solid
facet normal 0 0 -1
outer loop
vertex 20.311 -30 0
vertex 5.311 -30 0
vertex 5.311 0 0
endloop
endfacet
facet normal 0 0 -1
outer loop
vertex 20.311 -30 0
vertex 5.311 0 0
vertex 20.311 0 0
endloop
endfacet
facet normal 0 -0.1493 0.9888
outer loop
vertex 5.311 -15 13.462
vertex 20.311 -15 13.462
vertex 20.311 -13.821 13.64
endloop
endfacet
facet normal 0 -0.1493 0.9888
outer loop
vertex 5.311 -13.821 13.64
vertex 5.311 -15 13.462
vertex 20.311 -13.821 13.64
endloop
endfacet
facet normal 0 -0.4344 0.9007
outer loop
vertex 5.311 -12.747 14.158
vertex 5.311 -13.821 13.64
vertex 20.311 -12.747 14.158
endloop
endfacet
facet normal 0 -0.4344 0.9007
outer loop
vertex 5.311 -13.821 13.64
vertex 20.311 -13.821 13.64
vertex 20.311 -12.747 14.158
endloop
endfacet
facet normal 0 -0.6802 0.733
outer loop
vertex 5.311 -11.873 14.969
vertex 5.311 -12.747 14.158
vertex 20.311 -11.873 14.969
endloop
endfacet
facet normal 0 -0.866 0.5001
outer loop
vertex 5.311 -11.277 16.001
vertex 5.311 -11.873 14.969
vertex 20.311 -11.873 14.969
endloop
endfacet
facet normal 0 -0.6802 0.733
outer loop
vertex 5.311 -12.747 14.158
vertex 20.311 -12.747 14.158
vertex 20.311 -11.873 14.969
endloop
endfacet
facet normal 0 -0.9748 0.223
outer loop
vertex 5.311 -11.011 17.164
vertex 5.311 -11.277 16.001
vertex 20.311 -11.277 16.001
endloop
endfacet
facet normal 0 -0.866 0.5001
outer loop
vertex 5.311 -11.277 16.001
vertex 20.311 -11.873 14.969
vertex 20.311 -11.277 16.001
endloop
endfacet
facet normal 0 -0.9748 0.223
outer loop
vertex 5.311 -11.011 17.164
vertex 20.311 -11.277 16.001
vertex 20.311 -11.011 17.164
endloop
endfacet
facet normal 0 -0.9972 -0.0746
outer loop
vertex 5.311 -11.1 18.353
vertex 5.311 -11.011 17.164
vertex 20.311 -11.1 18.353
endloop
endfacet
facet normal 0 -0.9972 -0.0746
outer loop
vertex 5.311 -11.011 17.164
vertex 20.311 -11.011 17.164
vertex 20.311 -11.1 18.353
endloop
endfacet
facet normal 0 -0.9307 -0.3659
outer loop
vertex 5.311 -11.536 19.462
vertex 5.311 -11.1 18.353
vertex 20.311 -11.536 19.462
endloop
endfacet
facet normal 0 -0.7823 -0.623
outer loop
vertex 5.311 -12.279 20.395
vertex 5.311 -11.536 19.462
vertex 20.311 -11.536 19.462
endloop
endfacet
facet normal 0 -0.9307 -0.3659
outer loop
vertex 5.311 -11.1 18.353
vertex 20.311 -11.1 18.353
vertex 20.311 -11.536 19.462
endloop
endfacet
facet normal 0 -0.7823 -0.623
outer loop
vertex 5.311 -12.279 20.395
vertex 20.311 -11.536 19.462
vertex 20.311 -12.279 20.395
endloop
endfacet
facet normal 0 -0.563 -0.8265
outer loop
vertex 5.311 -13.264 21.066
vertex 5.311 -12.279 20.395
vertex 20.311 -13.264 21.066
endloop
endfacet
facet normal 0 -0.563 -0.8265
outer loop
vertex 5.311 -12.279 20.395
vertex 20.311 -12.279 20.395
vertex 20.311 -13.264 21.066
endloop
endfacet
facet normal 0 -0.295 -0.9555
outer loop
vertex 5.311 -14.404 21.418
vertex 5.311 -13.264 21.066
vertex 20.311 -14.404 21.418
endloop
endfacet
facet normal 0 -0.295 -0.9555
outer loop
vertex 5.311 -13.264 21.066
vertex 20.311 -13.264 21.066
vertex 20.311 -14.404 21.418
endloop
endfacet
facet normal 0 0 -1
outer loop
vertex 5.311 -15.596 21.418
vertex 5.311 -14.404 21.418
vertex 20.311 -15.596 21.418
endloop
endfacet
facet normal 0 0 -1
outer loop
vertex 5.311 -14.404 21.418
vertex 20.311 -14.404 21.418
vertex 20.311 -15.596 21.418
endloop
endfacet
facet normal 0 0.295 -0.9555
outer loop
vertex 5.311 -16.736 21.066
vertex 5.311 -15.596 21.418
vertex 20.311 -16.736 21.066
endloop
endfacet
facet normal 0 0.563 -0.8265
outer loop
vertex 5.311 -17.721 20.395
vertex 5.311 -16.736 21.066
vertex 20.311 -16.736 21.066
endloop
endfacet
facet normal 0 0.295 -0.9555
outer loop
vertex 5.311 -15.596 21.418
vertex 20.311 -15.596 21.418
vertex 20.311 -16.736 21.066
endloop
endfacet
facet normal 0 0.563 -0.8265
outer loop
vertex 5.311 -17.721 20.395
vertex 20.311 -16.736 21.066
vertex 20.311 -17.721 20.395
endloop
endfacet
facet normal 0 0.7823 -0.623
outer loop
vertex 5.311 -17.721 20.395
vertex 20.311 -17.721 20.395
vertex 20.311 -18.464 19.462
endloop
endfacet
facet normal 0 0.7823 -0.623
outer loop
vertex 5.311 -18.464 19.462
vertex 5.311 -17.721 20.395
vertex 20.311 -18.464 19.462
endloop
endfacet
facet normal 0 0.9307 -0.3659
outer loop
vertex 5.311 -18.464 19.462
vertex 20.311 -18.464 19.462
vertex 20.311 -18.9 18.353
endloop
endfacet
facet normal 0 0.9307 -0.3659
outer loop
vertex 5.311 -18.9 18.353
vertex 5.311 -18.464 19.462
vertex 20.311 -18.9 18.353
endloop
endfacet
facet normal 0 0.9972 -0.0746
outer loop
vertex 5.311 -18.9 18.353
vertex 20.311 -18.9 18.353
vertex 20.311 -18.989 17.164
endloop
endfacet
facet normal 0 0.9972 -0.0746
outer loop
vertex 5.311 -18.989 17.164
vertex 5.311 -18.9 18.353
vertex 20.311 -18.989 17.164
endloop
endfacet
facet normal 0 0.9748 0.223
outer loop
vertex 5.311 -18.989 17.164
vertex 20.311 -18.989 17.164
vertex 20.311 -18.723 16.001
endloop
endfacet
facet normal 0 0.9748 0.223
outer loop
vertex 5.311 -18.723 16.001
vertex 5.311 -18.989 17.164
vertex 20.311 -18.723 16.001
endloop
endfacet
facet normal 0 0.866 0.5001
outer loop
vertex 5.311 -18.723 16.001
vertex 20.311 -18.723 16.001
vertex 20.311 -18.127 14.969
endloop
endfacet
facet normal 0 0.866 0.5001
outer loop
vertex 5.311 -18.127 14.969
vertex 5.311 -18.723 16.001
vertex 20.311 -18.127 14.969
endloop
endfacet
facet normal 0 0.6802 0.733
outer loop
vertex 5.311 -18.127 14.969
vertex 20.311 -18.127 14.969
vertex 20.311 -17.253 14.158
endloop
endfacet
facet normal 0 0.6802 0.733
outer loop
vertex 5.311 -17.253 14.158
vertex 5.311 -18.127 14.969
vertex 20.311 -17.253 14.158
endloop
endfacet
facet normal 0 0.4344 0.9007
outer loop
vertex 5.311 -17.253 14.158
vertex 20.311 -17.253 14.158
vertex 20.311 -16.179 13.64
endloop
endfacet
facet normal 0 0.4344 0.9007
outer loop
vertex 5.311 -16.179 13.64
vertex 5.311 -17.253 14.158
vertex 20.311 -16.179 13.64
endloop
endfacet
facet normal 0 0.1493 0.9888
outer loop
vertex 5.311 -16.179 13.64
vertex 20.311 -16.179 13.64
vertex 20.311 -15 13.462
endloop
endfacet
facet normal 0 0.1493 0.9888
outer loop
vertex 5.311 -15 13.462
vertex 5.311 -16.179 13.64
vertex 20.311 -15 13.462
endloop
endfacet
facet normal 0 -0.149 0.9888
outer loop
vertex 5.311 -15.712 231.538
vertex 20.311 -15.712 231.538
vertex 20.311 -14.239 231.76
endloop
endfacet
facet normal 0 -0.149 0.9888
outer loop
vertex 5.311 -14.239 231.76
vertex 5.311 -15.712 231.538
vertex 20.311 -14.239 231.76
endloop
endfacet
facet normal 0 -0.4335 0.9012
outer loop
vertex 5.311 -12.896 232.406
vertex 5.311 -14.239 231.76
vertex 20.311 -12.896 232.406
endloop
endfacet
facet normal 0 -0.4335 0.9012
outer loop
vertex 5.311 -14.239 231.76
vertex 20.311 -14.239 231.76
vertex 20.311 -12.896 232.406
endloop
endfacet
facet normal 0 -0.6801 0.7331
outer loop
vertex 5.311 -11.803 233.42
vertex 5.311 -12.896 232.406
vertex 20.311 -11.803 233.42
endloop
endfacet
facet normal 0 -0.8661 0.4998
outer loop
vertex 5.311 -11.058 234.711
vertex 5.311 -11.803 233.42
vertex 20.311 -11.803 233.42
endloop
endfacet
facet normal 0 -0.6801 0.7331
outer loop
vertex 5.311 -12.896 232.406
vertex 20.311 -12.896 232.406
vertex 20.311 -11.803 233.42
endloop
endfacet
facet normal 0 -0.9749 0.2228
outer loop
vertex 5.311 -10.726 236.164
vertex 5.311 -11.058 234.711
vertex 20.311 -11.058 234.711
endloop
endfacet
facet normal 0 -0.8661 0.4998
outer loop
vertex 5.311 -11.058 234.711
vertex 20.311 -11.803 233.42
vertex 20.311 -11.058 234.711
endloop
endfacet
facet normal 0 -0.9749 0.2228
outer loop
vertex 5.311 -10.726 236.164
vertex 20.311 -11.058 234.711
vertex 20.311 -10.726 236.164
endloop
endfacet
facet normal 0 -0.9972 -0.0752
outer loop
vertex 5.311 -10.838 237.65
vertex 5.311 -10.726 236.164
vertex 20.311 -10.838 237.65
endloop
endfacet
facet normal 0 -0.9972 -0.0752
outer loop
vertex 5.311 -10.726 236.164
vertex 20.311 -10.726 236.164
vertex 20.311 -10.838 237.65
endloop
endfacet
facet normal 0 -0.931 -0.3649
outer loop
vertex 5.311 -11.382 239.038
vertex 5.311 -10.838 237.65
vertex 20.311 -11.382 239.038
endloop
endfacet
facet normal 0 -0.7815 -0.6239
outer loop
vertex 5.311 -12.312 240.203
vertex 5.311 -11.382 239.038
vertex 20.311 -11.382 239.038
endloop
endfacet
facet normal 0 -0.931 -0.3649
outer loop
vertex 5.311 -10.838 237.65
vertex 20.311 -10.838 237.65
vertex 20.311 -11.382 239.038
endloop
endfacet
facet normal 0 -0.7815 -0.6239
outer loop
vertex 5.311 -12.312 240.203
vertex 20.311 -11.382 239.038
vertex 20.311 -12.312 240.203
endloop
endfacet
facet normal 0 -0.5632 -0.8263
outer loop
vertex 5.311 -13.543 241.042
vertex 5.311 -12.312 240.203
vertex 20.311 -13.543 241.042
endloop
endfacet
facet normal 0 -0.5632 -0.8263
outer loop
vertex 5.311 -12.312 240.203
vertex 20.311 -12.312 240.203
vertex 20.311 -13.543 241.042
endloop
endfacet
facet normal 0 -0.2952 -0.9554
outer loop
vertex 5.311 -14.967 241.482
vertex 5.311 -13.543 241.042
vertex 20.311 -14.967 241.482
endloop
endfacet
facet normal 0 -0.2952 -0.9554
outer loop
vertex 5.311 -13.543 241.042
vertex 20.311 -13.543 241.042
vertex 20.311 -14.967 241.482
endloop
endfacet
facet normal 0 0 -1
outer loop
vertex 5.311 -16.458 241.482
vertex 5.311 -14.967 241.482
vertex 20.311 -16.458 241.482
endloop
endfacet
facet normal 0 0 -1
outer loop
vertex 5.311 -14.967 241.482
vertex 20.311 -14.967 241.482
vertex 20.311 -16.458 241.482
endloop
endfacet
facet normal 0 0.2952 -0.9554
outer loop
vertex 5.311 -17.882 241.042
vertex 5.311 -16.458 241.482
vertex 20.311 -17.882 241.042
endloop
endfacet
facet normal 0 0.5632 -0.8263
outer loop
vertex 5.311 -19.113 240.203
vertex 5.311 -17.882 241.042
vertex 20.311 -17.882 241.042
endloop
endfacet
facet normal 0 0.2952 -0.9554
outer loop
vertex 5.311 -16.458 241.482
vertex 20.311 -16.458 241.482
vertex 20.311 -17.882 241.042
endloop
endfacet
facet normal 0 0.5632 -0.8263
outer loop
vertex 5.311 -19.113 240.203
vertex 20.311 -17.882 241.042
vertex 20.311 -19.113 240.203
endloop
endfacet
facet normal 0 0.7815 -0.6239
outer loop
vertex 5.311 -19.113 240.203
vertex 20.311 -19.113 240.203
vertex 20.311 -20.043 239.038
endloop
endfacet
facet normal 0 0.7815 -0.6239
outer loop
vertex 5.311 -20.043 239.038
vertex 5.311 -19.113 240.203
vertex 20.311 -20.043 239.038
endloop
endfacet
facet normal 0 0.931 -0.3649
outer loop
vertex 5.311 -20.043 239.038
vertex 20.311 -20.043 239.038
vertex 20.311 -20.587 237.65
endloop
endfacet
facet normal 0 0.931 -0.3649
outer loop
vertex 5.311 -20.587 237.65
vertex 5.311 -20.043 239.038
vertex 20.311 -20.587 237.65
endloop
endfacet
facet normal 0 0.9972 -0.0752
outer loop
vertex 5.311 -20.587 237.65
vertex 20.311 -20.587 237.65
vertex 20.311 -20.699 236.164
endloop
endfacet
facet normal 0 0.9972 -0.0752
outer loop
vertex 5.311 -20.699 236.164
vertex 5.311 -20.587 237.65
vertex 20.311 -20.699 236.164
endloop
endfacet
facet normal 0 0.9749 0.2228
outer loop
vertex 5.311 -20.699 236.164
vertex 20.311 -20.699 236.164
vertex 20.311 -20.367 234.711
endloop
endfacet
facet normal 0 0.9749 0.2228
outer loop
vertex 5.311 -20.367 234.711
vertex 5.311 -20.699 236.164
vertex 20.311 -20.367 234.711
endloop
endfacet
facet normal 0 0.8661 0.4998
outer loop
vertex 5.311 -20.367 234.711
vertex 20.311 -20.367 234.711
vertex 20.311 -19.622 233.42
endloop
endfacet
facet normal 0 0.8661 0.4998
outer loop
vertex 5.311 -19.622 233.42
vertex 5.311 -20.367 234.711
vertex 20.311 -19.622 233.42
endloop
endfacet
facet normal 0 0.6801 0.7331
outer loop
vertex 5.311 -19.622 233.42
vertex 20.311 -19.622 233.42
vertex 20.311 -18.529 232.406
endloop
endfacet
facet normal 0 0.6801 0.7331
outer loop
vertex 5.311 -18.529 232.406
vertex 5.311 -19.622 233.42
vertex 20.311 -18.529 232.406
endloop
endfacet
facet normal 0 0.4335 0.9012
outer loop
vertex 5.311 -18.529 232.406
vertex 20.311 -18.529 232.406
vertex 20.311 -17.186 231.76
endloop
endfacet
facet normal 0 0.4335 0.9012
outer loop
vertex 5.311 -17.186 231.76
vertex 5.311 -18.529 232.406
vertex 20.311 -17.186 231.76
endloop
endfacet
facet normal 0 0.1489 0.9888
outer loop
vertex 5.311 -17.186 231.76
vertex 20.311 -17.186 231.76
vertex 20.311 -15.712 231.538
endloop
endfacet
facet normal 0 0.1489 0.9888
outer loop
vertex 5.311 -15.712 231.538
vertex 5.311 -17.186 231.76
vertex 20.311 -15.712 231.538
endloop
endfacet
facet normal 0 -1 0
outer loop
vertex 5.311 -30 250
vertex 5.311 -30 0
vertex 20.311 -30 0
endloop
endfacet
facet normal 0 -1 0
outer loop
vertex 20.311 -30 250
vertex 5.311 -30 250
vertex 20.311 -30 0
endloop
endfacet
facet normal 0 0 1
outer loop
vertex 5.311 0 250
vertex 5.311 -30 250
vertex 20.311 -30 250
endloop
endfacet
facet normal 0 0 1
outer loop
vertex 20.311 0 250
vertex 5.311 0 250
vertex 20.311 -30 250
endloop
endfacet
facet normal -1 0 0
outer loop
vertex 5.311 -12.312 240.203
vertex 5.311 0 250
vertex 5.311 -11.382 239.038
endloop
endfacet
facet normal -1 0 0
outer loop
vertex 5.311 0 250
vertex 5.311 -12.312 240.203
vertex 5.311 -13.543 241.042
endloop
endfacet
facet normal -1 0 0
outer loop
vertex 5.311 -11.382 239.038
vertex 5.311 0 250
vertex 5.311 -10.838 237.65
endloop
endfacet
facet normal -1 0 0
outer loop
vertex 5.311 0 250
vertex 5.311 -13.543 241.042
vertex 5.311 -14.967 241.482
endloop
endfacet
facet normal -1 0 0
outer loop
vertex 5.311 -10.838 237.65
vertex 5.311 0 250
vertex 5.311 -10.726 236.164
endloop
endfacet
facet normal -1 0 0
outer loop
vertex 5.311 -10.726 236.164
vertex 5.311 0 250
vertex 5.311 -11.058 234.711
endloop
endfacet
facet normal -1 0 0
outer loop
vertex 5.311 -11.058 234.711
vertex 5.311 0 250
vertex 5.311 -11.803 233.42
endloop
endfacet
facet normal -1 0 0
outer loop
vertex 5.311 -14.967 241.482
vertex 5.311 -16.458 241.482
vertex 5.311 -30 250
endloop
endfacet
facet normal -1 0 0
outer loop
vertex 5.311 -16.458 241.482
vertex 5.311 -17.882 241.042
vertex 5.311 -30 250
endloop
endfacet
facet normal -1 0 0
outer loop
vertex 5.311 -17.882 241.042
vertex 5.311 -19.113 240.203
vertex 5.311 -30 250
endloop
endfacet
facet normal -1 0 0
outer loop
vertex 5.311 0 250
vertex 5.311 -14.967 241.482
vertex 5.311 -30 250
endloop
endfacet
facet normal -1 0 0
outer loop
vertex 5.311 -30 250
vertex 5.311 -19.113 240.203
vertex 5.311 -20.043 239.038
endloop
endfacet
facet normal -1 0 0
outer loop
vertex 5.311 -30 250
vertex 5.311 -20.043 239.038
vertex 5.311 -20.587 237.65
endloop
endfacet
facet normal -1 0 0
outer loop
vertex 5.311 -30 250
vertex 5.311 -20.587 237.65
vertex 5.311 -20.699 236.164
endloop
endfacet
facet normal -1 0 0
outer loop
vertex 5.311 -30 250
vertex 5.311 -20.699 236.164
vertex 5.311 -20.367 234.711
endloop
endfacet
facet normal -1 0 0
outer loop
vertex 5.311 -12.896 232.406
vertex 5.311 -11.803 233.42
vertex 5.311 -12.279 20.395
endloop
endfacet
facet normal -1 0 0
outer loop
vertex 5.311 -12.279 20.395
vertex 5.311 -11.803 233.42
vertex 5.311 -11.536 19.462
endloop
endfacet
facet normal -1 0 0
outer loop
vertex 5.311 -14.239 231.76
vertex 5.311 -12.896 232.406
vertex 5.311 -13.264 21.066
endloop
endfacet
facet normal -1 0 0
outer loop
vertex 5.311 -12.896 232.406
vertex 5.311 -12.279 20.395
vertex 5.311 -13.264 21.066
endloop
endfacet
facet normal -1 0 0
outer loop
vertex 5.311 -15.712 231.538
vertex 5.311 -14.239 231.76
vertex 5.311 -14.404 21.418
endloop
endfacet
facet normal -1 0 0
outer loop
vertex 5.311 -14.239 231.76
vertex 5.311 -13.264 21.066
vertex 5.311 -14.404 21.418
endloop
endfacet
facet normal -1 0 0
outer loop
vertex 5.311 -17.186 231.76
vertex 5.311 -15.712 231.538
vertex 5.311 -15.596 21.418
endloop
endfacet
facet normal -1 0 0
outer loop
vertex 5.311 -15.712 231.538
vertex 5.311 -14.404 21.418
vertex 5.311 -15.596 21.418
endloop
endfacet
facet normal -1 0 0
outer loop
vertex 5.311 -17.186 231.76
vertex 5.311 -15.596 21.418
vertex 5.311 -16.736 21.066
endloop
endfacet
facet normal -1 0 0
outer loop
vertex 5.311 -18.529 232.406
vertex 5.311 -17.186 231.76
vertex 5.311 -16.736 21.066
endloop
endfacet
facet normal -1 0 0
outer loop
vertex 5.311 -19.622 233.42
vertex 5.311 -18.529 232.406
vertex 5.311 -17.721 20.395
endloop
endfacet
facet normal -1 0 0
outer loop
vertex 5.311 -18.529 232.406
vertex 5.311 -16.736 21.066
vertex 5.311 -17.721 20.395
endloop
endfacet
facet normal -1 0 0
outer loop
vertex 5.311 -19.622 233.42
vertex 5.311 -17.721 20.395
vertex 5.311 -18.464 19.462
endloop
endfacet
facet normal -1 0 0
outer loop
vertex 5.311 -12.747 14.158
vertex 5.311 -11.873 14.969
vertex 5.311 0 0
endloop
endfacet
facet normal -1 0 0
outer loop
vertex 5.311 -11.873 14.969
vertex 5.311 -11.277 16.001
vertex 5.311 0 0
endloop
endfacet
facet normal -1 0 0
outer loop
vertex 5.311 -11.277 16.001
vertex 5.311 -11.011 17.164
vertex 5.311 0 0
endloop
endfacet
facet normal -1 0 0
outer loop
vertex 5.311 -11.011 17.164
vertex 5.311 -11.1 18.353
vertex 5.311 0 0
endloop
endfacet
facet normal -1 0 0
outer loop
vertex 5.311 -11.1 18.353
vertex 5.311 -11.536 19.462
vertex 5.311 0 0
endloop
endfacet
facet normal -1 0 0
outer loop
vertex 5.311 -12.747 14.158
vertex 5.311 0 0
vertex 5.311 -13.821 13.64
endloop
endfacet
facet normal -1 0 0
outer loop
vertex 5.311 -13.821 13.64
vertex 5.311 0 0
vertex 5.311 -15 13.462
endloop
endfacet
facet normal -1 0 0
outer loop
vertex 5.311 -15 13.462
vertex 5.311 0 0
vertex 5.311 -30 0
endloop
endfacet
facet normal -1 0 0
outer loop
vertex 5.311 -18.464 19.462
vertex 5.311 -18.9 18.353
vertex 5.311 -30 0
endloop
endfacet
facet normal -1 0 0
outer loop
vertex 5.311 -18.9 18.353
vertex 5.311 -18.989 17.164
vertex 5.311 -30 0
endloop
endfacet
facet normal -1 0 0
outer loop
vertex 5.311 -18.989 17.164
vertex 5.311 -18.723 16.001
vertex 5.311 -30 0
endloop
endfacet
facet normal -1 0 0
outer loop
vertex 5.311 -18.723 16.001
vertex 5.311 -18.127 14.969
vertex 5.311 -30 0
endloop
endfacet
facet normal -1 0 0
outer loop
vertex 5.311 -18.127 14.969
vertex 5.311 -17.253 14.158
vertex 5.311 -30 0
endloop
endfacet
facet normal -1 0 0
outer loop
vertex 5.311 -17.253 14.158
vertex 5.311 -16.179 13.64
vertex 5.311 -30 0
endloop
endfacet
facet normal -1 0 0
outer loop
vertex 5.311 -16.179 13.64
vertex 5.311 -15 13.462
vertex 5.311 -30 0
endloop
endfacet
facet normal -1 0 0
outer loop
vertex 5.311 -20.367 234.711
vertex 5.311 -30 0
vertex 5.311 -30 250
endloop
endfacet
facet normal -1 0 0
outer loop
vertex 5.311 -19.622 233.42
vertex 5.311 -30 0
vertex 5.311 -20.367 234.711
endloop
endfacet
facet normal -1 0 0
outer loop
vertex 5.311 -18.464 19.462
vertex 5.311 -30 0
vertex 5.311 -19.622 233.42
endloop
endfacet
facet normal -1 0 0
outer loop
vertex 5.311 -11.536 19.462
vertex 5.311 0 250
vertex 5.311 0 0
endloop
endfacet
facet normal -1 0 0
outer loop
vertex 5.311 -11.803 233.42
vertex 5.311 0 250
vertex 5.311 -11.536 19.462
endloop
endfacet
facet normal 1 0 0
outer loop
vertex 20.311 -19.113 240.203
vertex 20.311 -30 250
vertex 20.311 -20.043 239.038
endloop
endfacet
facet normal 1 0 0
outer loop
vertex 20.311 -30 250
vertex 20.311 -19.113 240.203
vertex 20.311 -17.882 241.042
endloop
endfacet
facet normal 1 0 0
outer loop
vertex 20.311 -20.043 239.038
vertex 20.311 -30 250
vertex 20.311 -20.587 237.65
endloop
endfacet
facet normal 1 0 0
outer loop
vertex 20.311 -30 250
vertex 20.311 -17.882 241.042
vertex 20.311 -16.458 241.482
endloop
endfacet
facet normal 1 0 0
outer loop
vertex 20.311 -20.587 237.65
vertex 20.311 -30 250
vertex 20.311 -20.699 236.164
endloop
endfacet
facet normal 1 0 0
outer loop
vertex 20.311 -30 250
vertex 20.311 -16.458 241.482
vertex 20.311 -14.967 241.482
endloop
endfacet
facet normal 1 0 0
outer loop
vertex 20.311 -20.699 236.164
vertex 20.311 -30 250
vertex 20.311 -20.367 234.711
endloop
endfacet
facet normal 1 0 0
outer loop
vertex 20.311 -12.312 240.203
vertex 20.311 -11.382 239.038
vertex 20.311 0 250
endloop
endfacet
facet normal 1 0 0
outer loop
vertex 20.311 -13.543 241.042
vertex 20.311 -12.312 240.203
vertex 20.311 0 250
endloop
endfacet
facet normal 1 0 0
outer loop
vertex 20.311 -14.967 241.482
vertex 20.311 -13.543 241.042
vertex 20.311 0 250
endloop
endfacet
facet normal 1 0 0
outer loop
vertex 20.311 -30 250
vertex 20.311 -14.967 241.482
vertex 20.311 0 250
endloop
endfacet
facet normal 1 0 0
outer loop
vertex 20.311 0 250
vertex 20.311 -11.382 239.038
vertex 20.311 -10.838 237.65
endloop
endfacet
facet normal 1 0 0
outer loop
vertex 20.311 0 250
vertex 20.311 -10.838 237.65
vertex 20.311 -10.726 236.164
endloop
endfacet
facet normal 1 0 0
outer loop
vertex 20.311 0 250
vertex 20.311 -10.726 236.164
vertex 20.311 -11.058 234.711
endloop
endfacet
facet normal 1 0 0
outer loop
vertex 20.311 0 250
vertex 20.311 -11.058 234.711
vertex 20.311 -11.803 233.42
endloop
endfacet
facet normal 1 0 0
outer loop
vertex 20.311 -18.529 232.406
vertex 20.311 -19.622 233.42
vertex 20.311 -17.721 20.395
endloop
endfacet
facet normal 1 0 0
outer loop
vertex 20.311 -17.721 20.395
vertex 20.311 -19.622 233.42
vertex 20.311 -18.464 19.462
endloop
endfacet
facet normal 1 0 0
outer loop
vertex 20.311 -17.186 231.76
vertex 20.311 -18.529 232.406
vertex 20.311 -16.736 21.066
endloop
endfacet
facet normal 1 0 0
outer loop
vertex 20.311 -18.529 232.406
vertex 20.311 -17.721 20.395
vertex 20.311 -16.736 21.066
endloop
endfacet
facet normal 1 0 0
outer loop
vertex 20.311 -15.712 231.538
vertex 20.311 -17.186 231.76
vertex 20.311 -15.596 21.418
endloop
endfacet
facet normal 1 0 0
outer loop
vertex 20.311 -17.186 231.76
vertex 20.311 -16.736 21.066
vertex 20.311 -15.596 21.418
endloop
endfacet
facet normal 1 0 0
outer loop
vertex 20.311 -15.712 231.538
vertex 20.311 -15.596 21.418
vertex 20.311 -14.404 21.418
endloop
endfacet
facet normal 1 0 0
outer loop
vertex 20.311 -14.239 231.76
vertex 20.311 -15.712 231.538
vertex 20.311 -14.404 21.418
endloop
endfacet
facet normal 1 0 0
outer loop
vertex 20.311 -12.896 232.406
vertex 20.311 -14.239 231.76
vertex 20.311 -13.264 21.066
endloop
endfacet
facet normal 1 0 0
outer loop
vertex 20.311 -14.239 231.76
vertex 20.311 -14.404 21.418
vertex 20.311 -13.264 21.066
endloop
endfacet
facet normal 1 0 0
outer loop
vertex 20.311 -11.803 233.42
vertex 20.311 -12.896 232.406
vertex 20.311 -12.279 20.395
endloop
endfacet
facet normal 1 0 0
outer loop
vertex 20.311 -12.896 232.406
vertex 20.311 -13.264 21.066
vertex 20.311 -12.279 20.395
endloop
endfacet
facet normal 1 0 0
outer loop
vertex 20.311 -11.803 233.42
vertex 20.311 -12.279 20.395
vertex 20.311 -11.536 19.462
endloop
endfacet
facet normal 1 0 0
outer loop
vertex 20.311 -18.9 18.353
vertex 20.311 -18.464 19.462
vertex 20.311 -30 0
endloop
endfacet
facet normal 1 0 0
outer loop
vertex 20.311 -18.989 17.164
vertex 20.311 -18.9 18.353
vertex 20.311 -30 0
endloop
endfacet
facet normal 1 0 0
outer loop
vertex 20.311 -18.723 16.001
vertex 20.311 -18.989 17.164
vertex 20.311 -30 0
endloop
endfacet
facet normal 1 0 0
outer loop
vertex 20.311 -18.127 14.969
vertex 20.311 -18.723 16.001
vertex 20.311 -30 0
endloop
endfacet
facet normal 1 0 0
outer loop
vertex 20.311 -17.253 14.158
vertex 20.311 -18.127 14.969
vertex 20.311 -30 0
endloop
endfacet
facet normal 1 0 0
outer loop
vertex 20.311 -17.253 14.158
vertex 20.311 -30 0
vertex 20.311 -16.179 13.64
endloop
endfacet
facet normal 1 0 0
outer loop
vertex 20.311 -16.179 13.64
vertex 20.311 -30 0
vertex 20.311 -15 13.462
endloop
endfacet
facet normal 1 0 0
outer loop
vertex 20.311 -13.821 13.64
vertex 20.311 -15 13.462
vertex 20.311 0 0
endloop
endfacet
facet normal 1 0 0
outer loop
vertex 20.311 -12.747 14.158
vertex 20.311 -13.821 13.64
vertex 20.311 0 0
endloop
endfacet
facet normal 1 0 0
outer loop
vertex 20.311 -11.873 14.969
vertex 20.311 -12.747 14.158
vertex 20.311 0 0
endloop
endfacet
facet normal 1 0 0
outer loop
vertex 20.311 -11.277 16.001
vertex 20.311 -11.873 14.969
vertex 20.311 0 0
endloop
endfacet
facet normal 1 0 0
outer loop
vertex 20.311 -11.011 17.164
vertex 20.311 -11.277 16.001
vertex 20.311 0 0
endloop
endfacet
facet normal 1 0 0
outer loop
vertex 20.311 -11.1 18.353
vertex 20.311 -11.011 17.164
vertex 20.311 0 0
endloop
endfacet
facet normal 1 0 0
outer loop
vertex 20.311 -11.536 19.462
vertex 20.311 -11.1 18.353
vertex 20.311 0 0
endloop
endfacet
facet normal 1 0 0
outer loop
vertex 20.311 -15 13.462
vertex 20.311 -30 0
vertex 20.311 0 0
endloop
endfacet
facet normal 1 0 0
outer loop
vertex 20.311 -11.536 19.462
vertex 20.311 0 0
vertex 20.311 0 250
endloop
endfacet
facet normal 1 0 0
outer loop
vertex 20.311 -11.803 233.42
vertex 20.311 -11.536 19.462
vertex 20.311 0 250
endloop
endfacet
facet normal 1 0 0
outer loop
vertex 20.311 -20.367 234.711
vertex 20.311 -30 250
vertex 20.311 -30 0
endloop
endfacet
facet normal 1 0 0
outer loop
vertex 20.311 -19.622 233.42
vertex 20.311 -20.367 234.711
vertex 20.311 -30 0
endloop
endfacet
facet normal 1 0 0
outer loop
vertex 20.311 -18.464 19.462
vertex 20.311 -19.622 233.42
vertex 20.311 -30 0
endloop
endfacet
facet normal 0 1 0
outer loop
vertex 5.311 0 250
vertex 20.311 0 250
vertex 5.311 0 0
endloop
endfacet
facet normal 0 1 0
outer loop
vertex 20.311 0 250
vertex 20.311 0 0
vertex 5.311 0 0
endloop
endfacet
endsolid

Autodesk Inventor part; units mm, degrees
ref_plane "YZ Plane" through (0, 0, 0) normal (1, 0, 0) x (0, 1, 0)
ref_plane "XZ Plane" through (0, 0, 0) normal (0, 1, 0) x (-1, 0, 0)
ref_plane "XY Plane" through (0, 0, 0) normal (0, 0, 1) x (1, 0, 0)
sketch "Sketch1" plane through (0, 0, 0) normal (0, 0, 1) x (1, 0, 0)
  point P0 (0, 0)
sketch "Sketch2" plane through (0, 0, 0) normal (0, 0, 1) x (1, 0, 0)
  line L0 (20.3112, 0) -> (5.3112, 0)
  line L1 (5.3112, 0) -> (5.3112, -30)
  line L2 (5.3112, -30) -> (20.3112, -30)
  line L3 (20.3112, -30) -> (20.3112, 0)
  point P0 (0, 0)
  dimension "d0" = 15
  dimension "d1" = 30
extrude "Extrusion1" add sketch "Sketch2" along normal blind 250
sketch "Sketch3" plane through (20.3112, -30, 0) normal (1, 0, 0) x (0, 0, -1)
  circle A0 centre (-17.4625, 15) radius 4
  point P0 (0, 30)
  dimension "d4" = 8
extrude "Extrusion2" cut sketch "Sketch3" against normal through all
sketch "Sketch4" plane through (20.3112, -30, 0) normal (1, 0, 0) x (0, 0, -1)
  circle A0 centre (-236.5375, 14.2875) radius 5
  point P0 (0, 30)
  dimension "d7" = 10
extrude "Extrusion3" cut sketch "Sketch4" against normal through all
properties part number "horizontal_strip"
